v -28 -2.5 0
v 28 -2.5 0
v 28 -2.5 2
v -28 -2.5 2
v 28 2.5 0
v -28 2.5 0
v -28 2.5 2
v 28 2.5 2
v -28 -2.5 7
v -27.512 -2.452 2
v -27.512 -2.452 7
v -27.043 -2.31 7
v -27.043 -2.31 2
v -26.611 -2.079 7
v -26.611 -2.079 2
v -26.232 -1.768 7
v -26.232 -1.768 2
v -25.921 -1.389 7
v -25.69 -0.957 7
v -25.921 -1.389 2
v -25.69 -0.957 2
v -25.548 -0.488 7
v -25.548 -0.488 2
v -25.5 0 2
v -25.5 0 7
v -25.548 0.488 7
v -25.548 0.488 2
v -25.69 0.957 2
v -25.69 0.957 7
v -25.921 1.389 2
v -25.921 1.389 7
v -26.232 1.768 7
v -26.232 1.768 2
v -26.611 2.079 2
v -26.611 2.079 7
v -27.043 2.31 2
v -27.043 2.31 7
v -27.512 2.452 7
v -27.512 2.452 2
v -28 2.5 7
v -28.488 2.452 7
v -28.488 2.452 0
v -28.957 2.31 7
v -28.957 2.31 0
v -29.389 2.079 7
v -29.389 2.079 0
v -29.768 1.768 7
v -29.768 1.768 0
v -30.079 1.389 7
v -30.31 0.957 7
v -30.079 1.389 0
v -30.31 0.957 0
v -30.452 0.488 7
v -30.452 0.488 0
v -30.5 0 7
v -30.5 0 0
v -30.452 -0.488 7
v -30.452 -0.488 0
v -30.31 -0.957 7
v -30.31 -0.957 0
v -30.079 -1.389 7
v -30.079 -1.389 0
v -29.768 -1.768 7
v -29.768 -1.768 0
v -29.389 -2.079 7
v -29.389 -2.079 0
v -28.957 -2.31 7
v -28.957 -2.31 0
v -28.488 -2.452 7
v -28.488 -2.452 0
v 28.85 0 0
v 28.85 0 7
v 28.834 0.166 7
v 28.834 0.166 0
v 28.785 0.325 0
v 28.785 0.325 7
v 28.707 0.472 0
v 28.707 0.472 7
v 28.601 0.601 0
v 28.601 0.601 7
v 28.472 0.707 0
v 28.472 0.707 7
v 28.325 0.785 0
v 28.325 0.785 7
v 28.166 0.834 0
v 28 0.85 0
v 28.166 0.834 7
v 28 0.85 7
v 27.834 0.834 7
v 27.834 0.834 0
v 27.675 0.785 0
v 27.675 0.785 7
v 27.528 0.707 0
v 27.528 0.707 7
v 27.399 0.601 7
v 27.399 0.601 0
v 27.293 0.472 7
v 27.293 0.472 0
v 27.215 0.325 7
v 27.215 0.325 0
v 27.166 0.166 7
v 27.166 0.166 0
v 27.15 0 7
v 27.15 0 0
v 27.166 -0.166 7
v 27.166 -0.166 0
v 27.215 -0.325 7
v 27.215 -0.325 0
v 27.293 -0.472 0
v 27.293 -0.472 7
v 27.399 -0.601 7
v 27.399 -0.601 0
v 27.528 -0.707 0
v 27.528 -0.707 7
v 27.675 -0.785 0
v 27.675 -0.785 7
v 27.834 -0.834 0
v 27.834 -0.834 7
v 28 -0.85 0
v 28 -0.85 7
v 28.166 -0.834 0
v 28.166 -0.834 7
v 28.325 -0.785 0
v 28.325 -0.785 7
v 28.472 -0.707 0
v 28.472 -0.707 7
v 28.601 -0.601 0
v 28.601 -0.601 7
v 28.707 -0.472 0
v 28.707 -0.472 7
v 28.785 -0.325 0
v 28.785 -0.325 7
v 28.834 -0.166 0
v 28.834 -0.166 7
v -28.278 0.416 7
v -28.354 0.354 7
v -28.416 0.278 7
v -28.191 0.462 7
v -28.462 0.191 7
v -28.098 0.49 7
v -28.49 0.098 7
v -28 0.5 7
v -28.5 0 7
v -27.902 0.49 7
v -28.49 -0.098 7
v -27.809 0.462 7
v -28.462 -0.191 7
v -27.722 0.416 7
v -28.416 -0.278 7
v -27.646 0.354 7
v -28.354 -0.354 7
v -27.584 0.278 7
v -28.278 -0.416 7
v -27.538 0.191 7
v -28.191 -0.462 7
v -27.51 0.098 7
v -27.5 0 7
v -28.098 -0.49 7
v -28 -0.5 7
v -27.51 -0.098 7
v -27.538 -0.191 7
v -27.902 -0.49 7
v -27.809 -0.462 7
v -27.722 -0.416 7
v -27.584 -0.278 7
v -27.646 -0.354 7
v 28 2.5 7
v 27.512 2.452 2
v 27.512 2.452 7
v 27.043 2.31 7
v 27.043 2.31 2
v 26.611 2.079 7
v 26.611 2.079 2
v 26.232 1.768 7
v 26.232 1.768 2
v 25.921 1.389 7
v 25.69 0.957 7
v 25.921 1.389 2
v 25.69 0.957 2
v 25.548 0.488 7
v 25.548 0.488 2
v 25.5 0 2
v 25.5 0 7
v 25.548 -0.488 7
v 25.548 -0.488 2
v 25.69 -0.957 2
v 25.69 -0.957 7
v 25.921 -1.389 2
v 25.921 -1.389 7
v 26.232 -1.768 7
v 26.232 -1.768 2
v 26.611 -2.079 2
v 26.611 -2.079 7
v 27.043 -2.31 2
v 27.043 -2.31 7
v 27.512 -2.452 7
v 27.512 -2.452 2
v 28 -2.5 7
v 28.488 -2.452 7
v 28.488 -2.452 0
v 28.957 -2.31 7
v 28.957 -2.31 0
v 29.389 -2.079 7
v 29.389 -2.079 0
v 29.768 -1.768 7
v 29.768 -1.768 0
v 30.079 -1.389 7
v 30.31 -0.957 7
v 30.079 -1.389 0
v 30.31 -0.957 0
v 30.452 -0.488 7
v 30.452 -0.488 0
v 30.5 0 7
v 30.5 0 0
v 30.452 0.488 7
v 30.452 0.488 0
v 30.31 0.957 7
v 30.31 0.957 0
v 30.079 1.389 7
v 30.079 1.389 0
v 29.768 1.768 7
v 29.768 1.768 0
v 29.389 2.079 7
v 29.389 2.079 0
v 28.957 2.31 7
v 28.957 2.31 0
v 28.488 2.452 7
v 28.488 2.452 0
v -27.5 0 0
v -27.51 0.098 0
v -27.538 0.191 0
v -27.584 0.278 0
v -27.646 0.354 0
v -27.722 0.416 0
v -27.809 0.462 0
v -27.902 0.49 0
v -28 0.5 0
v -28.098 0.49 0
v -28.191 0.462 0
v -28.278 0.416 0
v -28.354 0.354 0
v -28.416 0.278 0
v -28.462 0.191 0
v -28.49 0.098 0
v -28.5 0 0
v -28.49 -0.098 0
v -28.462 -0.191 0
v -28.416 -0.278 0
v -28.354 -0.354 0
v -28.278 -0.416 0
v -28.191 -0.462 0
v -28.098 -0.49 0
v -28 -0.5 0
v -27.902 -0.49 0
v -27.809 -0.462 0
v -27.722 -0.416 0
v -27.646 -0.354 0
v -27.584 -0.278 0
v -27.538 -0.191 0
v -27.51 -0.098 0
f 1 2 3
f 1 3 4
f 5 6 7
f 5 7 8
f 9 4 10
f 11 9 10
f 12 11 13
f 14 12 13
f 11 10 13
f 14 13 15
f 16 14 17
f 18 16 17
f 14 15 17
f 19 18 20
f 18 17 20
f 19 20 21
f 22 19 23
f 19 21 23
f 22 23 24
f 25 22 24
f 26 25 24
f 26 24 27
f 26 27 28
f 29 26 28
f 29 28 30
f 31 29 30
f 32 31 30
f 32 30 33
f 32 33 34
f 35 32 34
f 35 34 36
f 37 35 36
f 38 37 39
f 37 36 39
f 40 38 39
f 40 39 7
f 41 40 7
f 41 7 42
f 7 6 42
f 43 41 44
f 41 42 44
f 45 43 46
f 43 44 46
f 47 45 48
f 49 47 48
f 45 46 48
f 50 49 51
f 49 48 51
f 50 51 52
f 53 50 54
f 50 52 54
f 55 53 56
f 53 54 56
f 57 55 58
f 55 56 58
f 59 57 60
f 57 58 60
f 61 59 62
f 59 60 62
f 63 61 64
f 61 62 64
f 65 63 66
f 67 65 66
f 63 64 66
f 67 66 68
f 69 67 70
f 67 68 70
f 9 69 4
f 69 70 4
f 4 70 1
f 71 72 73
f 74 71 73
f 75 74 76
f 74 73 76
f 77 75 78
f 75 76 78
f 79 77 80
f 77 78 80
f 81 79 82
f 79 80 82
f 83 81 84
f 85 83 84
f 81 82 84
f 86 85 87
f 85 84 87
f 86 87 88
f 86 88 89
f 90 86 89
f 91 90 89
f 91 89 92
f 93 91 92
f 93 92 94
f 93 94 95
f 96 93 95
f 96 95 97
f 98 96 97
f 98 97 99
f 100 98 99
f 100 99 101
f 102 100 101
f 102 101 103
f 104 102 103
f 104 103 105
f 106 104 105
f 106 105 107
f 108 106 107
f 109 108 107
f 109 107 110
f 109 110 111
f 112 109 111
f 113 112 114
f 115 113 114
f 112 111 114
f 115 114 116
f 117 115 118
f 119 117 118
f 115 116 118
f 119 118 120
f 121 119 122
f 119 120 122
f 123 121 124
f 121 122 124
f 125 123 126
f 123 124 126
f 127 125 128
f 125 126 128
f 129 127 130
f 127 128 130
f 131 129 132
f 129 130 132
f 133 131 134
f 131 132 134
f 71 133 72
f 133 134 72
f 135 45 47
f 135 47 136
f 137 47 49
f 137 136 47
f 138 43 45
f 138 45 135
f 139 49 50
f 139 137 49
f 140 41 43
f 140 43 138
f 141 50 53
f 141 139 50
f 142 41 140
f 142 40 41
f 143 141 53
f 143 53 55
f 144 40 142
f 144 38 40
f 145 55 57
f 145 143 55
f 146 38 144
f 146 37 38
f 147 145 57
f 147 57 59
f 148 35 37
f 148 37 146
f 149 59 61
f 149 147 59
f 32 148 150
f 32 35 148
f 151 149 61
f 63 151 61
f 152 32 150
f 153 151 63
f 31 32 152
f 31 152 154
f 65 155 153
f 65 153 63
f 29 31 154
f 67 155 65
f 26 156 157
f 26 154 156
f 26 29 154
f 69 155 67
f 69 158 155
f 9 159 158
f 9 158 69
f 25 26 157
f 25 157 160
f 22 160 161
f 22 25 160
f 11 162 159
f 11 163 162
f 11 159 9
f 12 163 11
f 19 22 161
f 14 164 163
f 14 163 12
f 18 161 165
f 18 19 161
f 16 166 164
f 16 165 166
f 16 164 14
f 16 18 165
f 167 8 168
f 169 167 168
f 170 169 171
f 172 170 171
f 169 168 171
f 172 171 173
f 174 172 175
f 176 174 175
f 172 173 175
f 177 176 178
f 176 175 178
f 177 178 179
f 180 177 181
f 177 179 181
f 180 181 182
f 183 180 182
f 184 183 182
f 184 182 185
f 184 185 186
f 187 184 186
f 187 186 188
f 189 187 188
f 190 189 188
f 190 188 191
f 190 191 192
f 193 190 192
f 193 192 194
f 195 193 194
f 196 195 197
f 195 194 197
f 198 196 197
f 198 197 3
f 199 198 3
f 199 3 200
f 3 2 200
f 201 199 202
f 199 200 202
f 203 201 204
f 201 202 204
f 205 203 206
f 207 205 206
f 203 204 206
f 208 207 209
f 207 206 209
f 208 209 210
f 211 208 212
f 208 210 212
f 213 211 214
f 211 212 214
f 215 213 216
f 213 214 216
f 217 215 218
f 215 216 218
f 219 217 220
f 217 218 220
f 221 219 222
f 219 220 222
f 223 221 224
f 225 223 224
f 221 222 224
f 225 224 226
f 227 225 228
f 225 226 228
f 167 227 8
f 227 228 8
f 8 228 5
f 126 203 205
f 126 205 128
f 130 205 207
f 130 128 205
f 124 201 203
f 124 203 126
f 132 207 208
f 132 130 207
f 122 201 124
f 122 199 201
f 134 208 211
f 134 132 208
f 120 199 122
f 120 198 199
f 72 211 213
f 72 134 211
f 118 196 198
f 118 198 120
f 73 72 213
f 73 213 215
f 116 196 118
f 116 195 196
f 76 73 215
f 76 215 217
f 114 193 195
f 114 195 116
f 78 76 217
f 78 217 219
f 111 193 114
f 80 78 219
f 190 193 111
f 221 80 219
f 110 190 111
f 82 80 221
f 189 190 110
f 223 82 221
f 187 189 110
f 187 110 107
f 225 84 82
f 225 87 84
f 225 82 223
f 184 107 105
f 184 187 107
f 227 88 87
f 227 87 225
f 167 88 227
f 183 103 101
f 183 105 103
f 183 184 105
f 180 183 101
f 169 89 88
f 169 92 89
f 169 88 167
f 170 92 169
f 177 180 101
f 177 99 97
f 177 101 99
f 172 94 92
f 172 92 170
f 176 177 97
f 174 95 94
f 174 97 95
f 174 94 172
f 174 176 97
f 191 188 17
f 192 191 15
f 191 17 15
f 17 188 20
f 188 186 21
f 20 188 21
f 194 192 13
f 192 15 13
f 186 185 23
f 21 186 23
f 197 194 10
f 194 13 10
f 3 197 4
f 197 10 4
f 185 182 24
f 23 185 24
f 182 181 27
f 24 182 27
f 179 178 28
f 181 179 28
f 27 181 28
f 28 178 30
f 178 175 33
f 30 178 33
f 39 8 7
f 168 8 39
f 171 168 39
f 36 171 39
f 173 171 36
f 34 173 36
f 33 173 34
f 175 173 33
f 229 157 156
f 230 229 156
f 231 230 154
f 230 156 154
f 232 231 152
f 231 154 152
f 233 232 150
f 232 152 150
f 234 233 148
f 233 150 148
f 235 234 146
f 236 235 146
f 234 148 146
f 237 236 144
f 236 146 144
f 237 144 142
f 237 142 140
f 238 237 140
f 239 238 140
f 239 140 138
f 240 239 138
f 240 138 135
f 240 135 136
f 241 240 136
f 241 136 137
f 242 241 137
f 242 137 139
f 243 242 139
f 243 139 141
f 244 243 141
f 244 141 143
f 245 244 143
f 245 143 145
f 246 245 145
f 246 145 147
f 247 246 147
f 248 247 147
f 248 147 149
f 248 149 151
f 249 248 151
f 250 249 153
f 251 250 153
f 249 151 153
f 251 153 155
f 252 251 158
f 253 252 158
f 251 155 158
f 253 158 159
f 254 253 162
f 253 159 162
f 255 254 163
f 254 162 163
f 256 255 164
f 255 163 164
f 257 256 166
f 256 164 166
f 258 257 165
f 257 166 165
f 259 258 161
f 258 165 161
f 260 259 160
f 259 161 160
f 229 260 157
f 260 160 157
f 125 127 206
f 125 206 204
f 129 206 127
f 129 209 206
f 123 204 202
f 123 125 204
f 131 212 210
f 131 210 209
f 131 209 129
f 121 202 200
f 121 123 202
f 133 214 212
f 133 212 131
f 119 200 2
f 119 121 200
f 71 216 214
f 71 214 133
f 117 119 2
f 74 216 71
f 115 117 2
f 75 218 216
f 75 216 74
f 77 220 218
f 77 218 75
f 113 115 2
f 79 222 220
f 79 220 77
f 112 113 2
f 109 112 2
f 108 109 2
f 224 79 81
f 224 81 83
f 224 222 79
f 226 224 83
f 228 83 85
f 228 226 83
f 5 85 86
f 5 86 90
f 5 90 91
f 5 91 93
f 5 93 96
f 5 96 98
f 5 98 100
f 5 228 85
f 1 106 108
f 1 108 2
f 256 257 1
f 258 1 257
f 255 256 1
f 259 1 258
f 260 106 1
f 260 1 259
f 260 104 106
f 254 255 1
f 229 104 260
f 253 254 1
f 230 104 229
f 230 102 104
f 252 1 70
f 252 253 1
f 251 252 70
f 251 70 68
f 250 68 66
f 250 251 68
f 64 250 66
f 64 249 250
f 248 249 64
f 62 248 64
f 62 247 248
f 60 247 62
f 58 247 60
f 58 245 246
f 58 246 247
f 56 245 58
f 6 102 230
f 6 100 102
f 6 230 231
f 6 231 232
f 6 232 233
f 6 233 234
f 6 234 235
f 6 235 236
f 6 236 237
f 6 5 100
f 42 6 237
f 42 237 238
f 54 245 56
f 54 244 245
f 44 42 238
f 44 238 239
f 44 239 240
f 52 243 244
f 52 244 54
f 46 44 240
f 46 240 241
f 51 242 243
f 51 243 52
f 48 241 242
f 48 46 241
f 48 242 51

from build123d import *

# Parameters (mm, degrees)
RESSALTO_EXTRUS_O1_DEPTH = 2
ESBO_O3_R                = 2.5
RESSALTO_EXTRUS_O2_DEPTH = 5
ESBO_O5_R                = 2.5
RESSALTO_EXTRUS_O3_DEPTH = 5
ESBO_O2_R                = 0.5
CORTE_EXTRUS_O1_DEPTH    = 32.392674305
ESBO_O4_R                = 0.85
CORTE_EXTRUS_O2_DEPTH    = 32.392674305


with BuildPart() as part:
    # Esboço1 → Ressalto-extrusão1 (new body)
    with BuildSketch(Plane.XY):
        with BuildLine():
            Line((-28, 2.5), (28, 2.5))
            ThreePointArc((28, 2.5), (30.5, 0), (28, -2.5))
            Line((28, -2.5), (-28, -2.5))
            ThreePointArc((-28, -2.5), (-30.5, 0), (-28, 2.5))
        make_face()
    extrude(amount=RESSALTO_EXTRUS_O1_DEPTH)

    # Esboço3 → Ressalto-extrusão2 (add)
    with BuildSketch(Plane.XY.offset(2)):
        with Locations(Location((28, 0, 0), (0, 0, 90))):
            Circle(ESBO_O3_R)
    extrude(amount=RESSALTO_EXTRUS_O2_DEPTH)

    # Esboço5 → Ressalto-extrusão3 (add)
    with BuildSketch(Plane.XY.offset(2)):
        with Locations(Location((-28, 0, 0), (0, 0, 270))):
            Circle(ESBO_O5_R)
    extrude(amount=RESSALTO_EXTRUS_O3_DEPTH)

    # Esboço2 → Corte-extrusão1 (cut, through all)
    with BuildSketch(Plane.XY.offset(7)):
        with Locations((-28, 0)):
            Circle(ESBO_O2_R)
    extrude(amount=-CORTE_EXTRUS_O1_DEPTH, mode=Mode.SUBTRACT)

    # Esboço4 → Corte-extrusão2 (cut, through all)
    with BuildSketch(Plane.XY.offset(7)):
        with Locations((28, 0)):
            Circle(ESBO_O4_R)
    extrude(amount=-CORTE_EXTRUS_O2_DEPTH, mode=Mode.SUBTRACT)


solid = part.part
